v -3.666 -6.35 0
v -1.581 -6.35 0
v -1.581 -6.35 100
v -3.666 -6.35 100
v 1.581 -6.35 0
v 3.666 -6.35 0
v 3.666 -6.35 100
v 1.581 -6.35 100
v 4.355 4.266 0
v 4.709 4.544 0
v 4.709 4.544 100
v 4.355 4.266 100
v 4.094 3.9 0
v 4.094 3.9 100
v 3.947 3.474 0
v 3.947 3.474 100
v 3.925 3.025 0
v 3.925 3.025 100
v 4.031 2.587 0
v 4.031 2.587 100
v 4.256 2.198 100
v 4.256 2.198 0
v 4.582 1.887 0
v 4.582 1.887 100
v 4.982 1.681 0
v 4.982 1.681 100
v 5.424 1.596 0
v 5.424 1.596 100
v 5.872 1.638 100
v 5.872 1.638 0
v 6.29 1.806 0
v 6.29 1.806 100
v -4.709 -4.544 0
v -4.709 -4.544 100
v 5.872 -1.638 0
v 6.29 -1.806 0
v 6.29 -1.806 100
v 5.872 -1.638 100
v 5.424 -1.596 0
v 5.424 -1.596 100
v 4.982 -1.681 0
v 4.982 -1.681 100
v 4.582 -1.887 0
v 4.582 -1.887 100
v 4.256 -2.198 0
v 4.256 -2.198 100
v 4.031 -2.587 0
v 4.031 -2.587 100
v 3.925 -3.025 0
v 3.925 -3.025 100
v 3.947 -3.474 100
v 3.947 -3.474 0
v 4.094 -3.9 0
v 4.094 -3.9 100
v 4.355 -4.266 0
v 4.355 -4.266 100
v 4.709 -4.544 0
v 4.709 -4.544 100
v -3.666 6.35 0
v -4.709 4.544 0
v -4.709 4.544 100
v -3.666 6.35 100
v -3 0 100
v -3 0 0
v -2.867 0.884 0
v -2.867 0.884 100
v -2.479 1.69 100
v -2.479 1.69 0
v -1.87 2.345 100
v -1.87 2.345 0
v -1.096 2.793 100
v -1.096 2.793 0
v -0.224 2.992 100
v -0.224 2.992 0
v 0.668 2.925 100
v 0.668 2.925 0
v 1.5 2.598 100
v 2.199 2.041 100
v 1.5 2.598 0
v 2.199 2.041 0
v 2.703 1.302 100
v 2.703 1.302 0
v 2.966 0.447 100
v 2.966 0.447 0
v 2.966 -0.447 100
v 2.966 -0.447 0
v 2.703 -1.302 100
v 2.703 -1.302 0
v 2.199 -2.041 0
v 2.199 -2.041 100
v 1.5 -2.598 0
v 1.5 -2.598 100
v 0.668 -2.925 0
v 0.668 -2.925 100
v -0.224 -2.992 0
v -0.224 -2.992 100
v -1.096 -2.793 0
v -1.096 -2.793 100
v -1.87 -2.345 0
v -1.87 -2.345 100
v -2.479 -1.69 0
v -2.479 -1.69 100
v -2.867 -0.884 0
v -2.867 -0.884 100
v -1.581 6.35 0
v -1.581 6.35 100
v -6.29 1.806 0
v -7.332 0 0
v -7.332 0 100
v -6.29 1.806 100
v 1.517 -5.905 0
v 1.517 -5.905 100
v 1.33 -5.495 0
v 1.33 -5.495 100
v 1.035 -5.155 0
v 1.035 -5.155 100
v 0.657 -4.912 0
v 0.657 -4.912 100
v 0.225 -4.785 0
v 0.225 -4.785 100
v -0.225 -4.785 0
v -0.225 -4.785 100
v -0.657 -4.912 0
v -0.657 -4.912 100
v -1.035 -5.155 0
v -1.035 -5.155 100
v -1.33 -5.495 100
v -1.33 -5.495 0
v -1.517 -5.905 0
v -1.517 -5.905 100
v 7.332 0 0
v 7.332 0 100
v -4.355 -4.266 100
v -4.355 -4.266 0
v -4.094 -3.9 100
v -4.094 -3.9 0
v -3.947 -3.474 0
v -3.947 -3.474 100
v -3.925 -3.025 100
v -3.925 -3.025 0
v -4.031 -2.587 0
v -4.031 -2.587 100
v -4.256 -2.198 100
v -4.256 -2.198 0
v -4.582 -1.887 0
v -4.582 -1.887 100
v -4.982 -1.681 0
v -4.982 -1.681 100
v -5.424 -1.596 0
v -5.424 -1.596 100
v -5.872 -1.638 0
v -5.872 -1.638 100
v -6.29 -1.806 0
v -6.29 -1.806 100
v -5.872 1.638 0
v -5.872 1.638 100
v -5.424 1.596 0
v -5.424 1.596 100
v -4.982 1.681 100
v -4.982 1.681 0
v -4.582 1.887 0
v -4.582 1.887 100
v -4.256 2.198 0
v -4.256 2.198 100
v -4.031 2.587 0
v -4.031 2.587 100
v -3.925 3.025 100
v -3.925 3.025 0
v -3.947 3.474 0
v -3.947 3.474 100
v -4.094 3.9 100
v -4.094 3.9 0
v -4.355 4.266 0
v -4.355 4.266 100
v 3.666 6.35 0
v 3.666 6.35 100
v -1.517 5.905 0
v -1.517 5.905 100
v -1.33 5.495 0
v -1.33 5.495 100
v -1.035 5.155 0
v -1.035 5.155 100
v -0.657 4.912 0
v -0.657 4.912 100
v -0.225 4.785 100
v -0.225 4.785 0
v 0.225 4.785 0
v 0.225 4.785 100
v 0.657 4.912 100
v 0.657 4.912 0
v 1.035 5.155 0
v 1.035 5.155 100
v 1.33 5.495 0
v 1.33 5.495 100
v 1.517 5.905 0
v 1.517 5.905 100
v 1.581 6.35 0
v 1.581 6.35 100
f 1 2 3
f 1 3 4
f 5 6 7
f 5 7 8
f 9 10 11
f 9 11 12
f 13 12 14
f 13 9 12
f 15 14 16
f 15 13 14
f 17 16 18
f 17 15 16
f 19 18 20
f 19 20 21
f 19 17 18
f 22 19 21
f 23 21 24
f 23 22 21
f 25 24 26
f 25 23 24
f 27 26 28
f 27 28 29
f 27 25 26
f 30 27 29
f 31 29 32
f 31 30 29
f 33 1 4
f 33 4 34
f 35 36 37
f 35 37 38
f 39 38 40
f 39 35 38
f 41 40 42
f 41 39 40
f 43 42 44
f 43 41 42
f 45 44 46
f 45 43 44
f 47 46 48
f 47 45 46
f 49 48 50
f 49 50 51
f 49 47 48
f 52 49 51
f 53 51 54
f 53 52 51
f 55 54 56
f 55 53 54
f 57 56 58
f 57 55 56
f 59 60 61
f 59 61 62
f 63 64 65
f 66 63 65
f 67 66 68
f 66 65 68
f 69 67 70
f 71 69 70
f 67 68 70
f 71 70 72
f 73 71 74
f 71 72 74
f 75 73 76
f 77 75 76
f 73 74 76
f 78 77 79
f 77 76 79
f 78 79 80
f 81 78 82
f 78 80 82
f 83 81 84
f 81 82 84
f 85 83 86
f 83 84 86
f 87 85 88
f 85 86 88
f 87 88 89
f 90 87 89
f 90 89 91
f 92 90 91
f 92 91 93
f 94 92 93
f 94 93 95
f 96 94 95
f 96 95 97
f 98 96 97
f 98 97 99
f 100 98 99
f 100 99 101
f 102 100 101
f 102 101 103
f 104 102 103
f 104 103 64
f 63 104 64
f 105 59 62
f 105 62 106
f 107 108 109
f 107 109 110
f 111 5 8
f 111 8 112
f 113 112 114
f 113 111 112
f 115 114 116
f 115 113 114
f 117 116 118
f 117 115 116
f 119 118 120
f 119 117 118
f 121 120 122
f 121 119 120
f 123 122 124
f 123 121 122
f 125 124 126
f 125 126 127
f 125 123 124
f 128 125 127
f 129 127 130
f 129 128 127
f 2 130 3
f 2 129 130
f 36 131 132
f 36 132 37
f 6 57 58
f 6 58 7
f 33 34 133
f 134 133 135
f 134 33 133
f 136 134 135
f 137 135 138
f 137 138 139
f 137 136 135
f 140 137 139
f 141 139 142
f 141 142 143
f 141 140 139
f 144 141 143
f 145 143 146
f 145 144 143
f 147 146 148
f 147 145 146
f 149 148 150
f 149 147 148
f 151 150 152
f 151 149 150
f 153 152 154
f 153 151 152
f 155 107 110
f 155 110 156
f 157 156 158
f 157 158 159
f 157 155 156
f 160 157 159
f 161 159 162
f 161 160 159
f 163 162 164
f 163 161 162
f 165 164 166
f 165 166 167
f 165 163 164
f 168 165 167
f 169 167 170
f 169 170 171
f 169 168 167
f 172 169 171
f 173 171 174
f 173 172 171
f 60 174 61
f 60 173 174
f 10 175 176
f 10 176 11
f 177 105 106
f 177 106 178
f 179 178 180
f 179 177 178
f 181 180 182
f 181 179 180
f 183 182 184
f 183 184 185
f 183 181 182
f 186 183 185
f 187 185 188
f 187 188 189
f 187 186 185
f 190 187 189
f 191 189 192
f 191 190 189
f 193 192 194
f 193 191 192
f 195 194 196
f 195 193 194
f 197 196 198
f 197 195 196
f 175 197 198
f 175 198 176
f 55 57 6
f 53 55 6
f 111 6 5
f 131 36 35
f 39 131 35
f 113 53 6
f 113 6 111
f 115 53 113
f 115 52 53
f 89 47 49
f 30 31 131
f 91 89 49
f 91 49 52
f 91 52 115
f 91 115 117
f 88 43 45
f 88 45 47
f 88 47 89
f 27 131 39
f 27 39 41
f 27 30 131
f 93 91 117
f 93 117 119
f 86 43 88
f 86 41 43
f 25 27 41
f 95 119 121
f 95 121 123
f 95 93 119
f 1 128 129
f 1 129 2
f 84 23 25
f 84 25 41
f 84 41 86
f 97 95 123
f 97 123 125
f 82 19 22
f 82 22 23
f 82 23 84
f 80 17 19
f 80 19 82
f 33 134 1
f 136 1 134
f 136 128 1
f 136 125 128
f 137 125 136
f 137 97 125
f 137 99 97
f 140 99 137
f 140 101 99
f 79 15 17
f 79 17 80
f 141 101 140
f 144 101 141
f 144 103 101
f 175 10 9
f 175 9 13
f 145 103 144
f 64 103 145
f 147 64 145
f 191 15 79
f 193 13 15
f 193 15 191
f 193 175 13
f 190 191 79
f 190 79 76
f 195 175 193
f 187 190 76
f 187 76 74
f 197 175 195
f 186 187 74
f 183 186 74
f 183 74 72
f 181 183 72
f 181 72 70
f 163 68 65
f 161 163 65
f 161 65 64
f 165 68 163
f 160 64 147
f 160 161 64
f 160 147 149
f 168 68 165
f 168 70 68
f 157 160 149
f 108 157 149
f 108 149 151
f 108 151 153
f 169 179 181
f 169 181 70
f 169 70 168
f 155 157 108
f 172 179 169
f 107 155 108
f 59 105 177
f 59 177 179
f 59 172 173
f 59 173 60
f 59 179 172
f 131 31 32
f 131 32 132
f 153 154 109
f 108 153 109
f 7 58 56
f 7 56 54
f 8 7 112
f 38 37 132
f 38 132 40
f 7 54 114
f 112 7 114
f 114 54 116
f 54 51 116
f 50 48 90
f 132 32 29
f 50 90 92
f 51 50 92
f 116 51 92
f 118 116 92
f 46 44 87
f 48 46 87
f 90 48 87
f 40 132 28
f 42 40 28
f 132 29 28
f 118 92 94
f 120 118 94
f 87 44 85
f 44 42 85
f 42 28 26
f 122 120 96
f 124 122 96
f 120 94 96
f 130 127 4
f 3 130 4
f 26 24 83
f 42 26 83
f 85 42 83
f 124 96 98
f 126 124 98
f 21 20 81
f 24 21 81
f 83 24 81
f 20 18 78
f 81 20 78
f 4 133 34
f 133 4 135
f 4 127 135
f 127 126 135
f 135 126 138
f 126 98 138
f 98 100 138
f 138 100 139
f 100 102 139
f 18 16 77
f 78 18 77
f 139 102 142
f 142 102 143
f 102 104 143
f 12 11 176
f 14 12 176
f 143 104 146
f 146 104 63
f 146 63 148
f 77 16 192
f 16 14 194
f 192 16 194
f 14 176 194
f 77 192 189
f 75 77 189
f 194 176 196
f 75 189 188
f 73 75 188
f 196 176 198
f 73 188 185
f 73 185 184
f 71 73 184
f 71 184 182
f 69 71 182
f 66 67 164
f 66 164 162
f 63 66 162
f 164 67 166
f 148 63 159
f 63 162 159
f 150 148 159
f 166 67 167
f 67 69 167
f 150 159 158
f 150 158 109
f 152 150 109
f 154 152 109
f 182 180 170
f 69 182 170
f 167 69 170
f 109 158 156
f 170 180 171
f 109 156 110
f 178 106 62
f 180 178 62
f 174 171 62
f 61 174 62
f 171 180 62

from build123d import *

# Parameters (mm, degrees)
Y_KSEKLIK_EKSTR_ZYON1_DEPTH = 100
IZIM6_R                     = 3
KES_EKSTR_ZYON2_DEPTH       = 1
KES_EKSTR_ZYON2_DEPTH_BACK  = 101


with BuildPart() as part:
    # Çizim4 → Yükseklik-Ekstrüzyon1 (new body)
    with BuildSketch(Plane.XY):
        with BuildLine():
            Line((-3.666174594, 6.349999778), (-1.581220903, 6.349999778))
            ThreePointArc((-1.581220903, 6.349999778), (-3.85e-07, 4.768779481), (1.581220134, 6.349999778))
            Line((1.581220134, 6.349999778), (3.666173825, 6.349999778))
            Line((3.666173825, 6.349999778), (4.708650587, 4.544377312))
            ThreePointArc((4.708650587, 4.544377312), (4.129884032, 2.384389991), (6.289871272, 1.805623132))
            Line((6.289871272, 1.805623132), (7.332348419, 0))
            Line((7.332348419, 0), (6.289871875, -1.805622592))
            ThreePointArc((6.289871875, -1.805622592), (4.12988432, -2.384389491), (4.708651522, -4.544376964))
            Line((4.708651522, -4.544376964), (3.666174594, -6.350000222))
            Line((3.666174594, -6.350000222), (1.581220903, -6.350000222))
            ThreePointArc((1.581220903, -6.350000222), (3.85e-07, -4.768779481), (-1.581220134, -6.350000222))
            Line((-1.581220134, -6.350000222), (-3.666173825, -6.350000222))
            Line((-3.666173825, -6.350000222), (-4.708650779, -4.544377423))
            ThreePointArc((-4.708650779, -4.544377423), (-4.129884032, -2.384389991), (-6.289871464, -1.805623243))
            Line((-6.289871464, -1.805623243), (-7.332348419, -4.44e-07))
            Line((-7.332348419, -4.44e-07), (-6.289871683, 1.805622481))
            ThreePointArc((-6.289871683, 1.805622481), (-4.12988432, 2.384389491), (-4.70865133, 4.544376853))
            Line((-4.70865133, 4.544376853), (-3.666174594, 6.349999778))
        make_face()
    extrude(amount=Y_KSEKLIK_EKSTR_ZYON1_DEPTH)

    # Çizim6 → Kes-Ekstrüzyon2 (cut, two sides)
    with BuildSketch(Plane(origin=(0, 0, 0), x_dir=(-1, 0, 0), z_dir=(0, 0, -1))) as kes_ekstr_zyon2_sk:
        Circle(IZIM6_R)
    extrude(amount=KES_EKSTR_ZYON2_DEPTH, mode=Mode.SUBTRACT)
    extrude(kes_ekstr_zyon2_sk.sketch, amount=-KES_EKSTR_ZYON2_DEPTH_BACK, mode=Mode.SUBTRACT)


solid = part.part
